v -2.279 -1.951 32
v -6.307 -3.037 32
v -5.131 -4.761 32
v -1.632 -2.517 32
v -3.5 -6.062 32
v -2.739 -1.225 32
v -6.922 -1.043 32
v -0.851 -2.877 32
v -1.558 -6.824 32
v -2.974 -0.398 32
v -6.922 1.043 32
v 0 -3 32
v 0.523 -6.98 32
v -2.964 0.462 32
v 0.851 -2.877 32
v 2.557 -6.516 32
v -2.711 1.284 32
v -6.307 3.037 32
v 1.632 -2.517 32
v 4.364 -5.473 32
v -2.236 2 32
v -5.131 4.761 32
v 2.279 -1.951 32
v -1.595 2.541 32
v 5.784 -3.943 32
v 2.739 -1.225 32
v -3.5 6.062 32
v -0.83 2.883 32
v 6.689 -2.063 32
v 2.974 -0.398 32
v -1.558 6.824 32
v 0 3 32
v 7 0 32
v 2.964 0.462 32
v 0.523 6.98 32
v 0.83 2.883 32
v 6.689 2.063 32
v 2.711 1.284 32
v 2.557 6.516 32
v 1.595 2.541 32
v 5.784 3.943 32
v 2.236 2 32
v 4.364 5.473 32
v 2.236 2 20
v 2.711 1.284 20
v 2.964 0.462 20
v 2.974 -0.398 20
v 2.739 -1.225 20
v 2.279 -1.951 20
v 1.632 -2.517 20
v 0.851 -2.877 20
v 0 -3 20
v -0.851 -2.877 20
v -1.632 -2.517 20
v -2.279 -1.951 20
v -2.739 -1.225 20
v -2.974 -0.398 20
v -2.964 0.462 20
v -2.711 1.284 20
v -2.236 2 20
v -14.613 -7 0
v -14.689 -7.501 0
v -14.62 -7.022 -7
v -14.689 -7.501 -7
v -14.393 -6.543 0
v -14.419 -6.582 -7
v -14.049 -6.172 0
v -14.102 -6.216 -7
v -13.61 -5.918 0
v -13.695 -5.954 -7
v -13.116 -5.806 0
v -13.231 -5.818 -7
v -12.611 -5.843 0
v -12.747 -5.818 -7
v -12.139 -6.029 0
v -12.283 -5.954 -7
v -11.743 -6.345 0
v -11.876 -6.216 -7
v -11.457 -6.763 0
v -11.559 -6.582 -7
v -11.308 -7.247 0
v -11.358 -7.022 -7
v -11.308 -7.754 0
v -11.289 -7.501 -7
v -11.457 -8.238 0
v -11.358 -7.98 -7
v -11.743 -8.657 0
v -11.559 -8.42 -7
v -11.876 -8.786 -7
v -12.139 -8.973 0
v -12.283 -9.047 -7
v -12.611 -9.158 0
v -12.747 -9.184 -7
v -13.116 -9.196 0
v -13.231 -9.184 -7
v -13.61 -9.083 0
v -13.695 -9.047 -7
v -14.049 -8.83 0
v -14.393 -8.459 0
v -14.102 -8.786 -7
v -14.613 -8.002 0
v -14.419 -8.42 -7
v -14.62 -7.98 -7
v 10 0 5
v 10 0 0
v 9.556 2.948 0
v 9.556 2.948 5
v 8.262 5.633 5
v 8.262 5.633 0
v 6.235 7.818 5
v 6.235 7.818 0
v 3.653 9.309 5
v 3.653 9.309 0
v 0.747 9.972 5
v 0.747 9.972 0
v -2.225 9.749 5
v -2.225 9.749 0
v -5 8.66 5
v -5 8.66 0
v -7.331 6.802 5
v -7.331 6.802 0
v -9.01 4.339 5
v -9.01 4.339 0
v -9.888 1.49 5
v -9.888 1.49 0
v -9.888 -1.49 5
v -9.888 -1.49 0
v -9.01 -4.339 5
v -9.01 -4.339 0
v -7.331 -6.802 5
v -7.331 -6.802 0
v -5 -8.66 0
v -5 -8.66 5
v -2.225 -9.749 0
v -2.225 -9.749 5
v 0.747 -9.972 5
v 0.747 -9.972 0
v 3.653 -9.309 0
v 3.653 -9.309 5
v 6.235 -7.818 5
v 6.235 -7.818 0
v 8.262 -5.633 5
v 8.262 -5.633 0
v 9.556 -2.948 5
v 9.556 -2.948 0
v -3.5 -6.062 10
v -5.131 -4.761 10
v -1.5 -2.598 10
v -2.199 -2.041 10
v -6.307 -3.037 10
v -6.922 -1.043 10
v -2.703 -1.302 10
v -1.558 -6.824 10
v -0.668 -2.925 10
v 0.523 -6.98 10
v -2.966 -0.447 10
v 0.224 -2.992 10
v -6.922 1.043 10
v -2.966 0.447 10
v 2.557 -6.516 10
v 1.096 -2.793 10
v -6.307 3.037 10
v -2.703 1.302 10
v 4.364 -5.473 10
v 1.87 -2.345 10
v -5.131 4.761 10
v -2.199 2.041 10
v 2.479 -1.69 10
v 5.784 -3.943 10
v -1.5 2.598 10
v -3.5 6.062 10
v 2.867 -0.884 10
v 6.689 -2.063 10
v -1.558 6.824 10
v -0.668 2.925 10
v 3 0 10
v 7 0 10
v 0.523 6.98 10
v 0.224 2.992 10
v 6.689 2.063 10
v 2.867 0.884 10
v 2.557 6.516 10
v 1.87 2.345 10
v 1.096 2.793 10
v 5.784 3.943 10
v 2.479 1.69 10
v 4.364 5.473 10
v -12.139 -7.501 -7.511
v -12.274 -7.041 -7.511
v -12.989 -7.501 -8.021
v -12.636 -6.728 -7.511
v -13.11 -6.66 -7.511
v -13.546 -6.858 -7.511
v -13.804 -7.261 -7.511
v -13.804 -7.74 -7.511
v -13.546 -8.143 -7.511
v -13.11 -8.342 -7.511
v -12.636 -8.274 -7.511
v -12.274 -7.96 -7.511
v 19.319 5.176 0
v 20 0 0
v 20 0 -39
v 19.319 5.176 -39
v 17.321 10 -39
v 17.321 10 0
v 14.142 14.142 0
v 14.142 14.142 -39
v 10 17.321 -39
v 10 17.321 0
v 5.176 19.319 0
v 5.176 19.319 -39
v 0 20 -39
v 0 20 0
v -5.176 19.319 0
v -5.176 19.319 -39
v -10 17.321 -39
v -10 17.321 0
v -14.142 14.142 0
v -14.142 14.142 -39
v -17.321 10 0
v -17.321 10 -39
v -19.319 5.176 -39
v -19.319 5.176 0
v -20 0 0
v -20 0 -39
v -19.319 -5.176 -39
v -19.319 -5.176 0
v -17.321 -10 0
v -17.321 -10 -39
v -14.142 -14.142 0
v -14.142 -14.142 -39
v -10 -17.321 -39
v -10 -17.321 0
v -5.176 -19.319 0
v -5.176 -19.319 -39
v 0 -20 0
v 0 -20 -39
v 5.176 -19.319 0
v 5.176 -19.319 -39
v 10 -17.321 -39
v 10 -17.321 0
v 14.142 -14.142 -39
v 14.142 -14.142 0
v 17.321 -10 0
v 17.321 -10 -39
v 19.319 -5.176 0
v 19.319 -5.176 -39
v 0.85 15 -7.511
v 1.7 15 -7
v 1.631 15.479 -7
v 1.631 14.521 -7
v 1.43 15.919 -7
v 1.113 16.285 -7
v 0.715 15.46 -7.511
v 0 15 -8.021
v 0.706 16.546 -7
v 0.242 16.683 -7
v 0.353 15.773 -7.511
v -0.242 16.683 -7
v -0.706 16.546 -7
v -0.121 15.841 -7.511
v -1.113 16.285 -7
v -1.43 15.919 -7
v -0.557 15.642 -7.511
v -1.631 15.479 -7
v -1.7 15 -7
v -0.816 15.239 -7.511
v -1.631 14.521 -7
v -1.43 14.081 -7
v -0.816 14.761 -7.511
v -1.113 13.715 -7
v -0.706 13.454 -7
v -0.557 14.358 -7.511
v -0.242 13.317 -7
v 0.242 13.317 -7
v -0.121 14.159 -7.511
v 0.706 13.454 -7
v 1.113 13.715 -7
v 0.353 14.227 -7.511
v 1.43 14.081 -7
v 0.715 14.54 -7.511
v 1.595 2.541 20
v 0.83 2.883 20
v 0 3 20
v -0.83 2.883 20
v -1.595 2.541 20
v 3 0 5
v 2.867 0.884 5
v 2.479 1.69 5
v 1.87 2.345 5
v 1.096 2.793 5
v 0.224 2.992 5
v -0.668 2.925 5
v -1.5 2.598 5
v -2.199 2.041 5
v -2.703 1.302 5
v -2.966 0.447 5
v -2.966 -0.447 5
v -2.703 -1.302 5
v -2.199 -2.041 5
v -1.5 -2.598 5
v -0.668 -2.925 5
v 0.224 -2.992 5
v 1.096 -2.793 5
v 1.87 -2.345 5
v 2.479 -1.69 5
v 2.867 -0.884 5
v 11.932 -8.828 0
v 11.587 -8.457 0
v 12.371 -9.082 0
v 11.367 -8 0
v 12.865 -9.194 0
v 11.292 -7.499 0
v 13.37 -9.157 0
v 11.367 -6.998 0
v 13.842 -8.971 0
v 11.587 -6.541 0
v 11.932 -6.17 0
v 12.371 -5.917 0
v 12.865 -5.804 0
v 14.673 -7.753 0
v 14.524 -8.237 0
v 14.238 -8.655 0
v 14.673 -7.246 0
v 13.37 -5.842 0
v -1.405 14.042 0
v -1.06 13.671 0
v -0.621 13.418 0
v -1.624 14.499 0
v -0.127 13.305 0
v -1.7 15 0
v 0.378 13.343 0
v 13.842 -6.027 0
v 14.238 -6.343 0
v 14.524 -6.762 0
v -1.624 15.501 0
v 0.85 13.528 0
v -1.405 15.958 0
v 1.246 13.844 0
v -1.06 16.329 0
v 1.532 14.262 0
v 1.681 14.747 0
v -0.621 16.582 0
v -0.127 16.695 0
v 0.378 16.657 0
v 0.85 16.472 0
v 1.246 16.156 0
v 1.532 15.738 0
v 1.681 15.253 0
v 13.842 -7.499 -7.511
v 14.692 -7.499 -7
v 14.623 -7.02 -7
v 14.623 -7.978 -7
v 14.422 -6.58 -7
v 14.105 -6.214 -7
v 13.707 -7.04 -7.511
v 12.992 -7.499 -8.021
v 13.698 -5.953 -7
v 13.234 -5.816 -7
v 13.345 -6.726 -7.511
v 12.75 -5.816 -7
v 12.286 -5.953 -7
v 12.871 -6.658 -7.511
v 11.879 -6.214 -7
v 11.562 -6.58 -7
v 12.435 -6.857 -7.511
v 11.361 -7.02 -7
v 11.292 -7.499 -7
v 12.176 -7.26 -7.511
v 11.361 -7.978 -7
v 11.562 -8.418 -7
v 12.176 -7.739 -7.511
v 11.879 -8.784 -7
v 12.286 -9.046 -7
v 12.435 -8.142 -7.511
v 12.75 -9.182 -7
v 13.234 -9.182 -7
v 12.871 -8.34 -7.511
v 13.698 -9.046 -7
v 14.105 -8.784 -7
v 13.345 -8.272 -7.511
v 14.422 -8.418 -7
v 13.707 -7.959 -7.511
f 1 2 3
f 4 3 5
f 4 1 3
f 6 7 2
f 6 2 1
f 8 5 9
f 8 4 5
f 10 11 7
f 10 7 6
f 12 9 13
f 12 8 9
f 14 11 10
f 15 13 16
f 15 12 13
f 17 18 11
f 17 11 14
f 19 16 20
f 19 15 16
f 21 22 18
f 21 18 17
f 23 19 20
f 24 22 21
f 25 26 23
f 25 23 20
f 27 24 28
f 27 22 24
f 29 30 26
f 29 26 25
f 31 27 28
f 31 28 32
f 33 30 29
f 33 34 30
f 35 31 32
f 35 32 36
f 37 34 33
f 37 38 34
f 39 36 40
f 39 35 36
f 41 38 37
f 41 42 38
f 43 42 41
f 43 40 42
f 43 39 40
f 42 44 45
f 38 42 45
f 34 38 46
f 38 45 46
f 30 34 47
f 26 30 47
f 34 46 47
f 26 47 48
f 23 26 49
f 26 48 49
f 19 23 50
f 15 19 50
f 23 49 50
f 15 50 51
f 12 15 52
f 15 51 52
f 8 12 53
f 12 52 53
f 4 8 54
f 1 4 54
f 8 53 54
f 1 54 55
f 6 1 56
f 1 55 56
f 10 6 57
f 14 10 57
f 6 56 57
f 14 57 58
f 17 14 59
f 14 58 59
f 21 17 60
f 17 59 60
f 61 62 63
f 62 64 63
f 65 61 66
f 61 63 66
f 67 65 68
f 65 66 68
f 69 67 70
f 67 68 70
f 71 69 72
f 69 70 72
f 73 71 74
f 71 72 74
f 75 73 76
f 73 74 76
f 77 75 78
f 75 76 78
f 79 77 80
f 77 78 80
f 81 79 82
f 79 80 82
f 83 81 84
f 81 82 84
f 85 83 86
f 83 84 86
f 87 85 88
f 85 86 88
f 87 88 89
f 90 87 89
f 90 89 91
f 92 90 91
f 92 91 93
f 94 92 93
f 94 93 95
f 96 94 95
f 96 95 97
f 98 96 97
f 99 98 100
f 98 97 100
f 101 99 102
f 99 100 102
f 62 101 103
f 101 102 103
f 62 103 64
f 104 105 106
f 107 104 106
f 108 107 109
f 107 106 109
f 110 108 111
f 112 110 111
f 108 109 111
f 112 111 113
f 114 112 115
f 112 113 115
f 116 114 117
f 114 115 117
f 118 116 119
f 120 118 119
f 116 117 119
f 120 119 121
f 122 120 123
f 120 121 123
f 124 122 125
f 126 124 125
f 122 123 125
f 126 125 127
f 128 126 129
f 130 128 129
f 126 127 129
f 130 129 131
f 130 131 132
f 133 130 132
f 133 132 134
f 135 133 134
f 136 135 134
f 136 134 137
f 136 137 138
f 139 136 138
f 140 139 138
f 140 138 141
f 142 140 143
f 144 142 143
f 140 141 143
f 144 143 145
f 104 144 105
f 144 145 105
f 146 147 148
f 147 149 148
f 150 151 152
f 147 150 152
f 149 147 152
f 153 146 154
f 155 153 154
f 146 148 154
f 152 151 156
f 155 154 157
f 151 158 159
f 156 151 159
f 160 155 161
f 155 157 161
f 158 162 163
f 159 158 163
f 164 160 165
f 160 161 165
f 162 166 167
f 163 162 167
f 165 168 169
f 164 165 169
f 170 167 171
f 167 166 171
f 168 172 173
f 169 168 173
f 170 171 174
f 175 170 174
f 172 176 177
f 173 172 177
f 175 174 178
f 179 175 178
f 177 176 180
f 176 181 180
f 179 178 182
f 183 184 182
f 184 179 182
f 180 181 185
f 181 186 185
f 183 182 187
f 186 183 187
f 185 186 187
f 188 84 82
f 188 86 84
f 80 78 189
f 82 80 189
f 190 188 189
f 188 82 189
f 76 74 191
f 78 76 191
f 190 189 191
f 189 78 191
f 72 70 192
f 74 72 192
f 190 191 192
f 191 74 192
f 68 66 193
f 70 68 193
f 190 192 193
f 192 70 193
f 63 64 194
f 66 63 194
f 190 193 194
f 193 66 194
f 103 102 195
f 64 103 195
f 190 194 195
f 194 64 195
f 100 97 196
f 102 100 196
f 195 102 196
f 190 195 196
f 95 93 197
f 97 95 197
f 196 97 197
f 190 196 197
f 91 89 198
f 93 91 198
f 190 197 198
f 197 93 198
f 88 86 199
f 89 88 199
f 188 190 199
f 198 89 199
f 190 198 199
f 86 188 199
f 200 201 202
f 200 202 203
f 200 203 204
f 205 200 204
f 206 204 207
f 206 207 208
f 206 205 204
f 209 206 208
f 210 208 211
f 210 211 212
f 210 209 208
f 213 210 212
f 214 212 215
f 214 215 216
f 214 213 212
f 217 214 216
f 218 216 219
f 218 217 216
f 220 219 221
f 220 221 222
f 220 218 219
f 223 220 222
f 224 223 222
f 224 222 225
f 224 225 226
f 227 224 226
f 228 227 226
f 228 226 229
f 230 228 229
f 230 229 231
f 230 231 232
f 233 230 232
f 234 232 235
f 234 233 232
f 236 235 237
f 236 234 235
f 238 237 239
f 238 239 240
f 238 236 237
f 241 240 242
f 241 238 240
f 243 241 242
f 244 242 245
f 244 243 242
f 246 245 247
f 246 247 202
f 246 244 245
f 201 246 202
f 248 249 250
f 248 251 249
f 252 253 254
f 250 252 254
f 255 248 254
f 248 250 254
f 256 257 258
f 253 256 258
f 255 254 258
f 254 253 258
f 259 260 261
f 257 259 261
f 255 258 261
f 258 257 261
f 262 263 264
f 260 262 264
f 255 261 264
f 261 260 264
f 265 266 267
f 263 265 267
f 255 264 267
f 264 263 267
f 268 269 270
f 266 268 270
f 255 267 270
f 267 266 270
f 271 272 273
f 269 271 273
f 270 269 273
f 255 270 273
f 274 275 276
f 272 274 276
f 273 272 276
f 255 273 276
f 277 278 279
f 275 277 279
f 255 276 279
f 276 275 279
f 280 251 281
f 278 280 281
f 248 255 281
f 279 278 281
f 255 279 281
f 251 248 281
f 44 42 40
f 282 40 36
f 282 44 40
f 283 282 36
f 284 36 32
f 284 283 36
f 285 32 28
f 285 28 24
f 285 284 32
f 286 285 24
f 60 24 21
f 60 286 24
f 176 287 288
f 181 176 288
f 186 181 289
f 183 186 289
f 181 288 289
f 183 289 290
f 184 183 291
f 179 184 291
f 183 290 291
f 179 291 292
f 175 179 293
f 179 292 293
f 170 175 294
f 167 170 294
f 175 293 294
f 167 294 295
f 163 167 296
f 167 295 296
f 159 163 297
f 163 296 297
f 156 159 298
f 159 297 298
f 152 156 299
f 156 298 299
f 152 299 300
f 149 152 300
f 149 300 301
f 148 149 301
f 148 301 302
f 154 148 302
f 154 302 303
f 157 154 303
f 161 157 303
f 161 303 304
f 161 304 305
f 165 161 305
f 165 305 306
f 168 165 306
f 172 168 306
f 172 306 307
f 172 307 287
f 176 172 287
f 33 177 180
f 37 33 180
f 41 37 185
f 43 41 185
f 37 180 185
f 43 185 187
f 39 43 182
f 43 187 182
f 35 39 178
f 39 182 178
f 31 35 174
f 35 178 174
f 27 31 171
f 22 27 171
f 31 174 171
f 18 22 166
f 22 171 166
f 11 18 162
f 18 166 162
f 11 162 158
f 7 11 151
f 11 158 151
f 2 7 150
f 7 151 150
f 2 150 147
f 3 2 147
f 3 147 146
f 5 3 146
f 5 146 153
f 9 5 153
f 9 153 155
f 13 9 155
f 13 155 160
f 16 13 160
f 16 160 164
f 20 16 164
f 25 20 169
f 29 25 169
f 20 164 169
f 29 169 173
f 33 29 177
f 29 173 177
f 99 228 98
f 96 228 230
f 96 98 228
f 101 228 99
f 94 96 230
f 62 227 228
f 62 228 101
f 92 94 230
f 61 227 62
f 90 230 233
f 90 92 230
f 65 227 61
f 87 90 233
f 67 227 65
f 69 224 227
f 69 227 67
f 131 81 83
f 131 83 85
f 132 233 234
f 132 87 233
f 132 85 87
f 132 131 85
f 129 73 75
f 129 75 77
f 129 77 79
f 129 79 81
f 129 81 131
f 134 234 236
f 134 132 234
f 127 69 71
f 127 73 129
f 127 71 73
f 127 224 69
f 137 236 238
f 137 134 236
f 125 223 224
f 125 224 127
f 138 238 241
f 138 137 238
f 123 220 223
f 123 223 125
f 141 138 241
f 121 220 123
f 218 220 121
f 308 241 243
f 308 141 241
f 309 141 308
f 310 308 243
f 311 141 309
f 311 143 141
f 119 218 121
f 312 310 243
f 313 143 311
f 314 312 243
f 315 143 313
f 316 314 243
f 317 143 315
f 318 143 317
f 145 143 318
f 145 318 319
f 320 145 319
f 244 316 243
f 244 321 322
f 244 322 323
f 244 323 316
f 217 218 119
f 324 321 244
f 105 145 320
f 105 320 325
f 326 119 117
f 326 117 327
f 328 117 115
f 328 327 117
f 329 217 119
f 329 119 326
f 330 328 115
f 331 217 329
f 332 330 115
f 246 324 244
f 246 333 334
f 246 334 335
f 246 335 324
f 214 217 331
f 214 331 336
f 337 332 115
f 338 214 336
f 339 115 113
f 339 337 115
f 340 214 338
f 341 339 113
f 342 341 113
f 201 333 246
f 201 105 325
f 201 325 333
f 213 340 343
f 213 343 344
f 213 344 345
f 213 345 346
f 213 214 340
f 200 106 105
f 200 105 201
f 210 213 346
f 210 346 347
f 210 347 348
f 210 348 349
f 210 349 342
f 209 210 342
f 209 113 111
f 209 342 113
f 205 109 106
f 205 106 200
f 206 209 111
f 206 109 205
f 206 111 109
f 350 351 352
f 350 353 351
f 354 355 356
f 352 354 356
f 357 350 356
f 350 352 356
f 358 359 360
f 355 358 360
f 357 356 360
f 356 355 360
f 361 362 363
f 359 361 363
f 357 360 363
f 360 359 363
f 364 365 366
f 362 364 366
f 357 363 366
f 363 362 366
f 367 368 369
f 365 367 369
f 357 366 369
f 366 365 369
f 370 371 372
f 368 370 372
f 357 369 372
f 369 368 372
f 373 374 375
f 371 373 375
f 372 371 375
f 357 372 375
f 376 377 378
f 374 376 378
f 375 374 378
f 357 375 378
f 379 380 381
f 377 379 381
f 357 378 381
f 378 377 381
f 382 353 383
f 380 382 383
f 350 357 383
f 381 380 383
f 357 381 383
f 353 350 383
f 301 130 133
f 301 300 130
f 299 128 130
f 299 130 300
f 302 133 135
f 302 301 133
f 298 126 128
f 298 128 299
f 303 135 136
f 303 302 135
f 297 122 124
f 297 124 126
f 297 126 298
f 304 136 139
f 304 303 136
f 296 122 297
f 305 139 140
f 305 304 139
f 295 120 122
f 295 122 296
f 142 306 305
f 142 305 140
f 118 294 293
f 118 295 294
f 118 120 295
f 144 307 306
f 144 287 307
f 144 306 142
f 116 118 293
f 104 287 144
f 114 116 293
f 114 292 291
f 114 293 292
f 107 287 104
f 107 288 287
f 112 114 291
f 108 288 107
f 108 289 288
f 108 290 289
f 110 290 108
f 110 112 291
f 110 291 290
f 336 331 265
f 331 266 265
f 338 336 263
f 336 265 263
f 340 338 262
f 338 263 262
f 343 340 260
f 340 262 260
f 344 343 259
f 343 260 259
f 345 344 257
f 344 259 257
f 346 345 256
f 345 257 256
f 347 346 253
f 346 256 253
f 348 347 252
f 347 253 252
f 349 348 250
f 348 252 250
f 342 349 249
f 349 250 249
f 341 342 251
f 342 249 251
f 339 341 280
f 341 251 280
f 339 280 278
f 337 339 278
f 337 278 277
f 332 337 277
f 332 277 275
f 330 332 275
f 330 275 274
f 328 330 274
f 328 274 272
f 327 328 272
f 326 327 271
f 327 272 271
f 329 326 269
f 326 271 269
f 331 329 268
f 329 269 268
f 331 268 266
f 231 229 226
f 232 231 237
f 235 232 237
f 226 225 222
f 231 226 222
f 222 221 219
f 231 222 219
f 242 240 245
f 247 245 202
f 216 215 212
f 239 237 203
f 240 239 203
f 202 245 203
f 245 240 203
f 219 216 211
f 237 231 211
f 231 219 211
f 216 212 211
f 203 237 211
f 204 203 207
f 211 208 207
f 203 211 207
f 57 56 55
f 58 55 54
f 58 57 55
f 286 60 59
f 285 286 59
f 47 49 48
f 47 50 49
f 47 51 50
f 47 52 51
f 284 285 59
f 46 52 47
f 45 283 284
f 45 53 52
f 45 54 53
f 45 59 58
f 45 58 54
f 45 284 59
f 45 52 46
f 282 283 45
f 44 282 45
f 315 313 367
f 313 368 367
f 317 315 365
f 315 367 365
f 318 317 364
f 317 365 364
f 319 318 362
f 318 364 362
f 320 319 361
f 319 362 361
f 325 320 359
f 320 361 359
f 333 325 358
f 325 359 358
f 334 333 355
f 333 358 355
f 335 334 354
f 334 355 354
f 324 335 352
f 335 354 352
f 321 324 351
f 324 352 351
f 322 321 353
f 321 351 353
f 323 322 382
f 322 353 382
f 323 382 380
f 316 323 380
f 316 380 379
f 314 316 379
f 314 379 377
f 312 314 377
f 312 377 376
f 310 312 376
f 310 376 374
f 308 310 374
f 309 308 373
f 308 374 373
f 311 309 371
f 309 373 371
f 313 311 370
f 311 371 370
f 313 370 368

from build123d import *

# Parameters (mm, degrees)
SKETCH1_R                = 20
BOSS_EXTRUDE1_DEPTH      = 39
SKETCH2_R                = 10
BOSS_EXTRUDE2_DEPTH      = 5
SKETCH7_R                = 3
BOSS_EXTRUDE3_DEPTH      = 5
BOSS_EXTRUDE4_DEPTH      = 10
M3_CLEARANCE_HOLE2_D     = 3.4
M3_CLEARANCE_HOLE2_DEPTH = 7
M3_CLEARANCE_HOLE2_TIP   = 1.021463052
SKETCH15_R               = 7
BOSS_EXTRUDE9_DEPTH      = 22
CUT_EXTRUDE3_START       = -12
SKETCH18_R               = 3
CUT_EXTRUDE3_DEPTH       = 12


with BuildPart() as part:
    # Sketch1 → Boss-Extrude1 (new body)
    with BuildSketch(Plane.XY):
        Circle(SKETCH1_R)
    extrude(amount=-BOSS_EXTRUDE1_DEPTH)

    # Sketch2 → Boss-Extrude2 (add)
    with BuildSketch(Plane.XY):
        Circle(SKETCH2_R)
    extrude(amount=BOSS_EXTRUDE2_DEPTH)

    # Sketch7 → Boss-Extrude3 (add)
    with BuildSketch(Plane.XY.offset(5)):
        Circle(SKETCH7_R)
    extrude(amount=BOSS_EXTRUDE3_DEPTH)

    # Sketch9 → Boss-Extrude4 (add)
    with BuildSketch(Plane.XY.offset(10)):
        with BuildLine():
            Line((-2.236067977, 2), (2.236067977, 2))
            ThreePointArc((2.236067977, 2), (0, -3), (-2.236067977, 2))
        make_face()
    extrude(amount=BOSS_EXTRUDE4_DEPTH)

    # M3 Clearance Hole2
    with Locations(Plane.XY):
        with Locations((0, 15), (12.991881057, -7.499133975), (-12.988881057, -7.500866025)):
            Hole(M3_CLEARANCE_HOLE2_D / 2, depth=M3_CLEARANCE_HOLE2_DEPTH)
            with Locations((0, 0, -(M3_CLEARANCE_HOLE2_DEPTH + M3_CLEARANCE_HOLE2_TIP / 2))):  # 118° drill point
                Cone(0, M3_CLEARANCE_HOLE2_D / 2, M3_CLEARANCE_HOLE2_TIP, mode=Mode.SUBTRACT)

    # Sketch15 → Boss-Extrude9 (add)
    with BuildSketch(Plane.XY.offset(10)):
        Circle(SKETCH15_R)
        with BuildLine():
            Line((-2.236067977, 2), (2.236067977, 2))
            ThreePointArc((2.236067977, 2), (0, -3), (-2.236067977, 2))
        make_face(mode=Mode.SUBTRACT)
    extrude(amount=BOSS_EXTRUDE9_DEPTH)

    # Sketch18 → Cut-Extrude3 (cut)
    with BuildSketch(Plane.XY.offset(32).offset(CUT_EXTRUDE3_START)):
        Circle(SKETCH18_R)
    extrude(amount=CUT_EXTRUDE3_DEPTH, mode=Mode.SUBTRACT)


solid = part.part
